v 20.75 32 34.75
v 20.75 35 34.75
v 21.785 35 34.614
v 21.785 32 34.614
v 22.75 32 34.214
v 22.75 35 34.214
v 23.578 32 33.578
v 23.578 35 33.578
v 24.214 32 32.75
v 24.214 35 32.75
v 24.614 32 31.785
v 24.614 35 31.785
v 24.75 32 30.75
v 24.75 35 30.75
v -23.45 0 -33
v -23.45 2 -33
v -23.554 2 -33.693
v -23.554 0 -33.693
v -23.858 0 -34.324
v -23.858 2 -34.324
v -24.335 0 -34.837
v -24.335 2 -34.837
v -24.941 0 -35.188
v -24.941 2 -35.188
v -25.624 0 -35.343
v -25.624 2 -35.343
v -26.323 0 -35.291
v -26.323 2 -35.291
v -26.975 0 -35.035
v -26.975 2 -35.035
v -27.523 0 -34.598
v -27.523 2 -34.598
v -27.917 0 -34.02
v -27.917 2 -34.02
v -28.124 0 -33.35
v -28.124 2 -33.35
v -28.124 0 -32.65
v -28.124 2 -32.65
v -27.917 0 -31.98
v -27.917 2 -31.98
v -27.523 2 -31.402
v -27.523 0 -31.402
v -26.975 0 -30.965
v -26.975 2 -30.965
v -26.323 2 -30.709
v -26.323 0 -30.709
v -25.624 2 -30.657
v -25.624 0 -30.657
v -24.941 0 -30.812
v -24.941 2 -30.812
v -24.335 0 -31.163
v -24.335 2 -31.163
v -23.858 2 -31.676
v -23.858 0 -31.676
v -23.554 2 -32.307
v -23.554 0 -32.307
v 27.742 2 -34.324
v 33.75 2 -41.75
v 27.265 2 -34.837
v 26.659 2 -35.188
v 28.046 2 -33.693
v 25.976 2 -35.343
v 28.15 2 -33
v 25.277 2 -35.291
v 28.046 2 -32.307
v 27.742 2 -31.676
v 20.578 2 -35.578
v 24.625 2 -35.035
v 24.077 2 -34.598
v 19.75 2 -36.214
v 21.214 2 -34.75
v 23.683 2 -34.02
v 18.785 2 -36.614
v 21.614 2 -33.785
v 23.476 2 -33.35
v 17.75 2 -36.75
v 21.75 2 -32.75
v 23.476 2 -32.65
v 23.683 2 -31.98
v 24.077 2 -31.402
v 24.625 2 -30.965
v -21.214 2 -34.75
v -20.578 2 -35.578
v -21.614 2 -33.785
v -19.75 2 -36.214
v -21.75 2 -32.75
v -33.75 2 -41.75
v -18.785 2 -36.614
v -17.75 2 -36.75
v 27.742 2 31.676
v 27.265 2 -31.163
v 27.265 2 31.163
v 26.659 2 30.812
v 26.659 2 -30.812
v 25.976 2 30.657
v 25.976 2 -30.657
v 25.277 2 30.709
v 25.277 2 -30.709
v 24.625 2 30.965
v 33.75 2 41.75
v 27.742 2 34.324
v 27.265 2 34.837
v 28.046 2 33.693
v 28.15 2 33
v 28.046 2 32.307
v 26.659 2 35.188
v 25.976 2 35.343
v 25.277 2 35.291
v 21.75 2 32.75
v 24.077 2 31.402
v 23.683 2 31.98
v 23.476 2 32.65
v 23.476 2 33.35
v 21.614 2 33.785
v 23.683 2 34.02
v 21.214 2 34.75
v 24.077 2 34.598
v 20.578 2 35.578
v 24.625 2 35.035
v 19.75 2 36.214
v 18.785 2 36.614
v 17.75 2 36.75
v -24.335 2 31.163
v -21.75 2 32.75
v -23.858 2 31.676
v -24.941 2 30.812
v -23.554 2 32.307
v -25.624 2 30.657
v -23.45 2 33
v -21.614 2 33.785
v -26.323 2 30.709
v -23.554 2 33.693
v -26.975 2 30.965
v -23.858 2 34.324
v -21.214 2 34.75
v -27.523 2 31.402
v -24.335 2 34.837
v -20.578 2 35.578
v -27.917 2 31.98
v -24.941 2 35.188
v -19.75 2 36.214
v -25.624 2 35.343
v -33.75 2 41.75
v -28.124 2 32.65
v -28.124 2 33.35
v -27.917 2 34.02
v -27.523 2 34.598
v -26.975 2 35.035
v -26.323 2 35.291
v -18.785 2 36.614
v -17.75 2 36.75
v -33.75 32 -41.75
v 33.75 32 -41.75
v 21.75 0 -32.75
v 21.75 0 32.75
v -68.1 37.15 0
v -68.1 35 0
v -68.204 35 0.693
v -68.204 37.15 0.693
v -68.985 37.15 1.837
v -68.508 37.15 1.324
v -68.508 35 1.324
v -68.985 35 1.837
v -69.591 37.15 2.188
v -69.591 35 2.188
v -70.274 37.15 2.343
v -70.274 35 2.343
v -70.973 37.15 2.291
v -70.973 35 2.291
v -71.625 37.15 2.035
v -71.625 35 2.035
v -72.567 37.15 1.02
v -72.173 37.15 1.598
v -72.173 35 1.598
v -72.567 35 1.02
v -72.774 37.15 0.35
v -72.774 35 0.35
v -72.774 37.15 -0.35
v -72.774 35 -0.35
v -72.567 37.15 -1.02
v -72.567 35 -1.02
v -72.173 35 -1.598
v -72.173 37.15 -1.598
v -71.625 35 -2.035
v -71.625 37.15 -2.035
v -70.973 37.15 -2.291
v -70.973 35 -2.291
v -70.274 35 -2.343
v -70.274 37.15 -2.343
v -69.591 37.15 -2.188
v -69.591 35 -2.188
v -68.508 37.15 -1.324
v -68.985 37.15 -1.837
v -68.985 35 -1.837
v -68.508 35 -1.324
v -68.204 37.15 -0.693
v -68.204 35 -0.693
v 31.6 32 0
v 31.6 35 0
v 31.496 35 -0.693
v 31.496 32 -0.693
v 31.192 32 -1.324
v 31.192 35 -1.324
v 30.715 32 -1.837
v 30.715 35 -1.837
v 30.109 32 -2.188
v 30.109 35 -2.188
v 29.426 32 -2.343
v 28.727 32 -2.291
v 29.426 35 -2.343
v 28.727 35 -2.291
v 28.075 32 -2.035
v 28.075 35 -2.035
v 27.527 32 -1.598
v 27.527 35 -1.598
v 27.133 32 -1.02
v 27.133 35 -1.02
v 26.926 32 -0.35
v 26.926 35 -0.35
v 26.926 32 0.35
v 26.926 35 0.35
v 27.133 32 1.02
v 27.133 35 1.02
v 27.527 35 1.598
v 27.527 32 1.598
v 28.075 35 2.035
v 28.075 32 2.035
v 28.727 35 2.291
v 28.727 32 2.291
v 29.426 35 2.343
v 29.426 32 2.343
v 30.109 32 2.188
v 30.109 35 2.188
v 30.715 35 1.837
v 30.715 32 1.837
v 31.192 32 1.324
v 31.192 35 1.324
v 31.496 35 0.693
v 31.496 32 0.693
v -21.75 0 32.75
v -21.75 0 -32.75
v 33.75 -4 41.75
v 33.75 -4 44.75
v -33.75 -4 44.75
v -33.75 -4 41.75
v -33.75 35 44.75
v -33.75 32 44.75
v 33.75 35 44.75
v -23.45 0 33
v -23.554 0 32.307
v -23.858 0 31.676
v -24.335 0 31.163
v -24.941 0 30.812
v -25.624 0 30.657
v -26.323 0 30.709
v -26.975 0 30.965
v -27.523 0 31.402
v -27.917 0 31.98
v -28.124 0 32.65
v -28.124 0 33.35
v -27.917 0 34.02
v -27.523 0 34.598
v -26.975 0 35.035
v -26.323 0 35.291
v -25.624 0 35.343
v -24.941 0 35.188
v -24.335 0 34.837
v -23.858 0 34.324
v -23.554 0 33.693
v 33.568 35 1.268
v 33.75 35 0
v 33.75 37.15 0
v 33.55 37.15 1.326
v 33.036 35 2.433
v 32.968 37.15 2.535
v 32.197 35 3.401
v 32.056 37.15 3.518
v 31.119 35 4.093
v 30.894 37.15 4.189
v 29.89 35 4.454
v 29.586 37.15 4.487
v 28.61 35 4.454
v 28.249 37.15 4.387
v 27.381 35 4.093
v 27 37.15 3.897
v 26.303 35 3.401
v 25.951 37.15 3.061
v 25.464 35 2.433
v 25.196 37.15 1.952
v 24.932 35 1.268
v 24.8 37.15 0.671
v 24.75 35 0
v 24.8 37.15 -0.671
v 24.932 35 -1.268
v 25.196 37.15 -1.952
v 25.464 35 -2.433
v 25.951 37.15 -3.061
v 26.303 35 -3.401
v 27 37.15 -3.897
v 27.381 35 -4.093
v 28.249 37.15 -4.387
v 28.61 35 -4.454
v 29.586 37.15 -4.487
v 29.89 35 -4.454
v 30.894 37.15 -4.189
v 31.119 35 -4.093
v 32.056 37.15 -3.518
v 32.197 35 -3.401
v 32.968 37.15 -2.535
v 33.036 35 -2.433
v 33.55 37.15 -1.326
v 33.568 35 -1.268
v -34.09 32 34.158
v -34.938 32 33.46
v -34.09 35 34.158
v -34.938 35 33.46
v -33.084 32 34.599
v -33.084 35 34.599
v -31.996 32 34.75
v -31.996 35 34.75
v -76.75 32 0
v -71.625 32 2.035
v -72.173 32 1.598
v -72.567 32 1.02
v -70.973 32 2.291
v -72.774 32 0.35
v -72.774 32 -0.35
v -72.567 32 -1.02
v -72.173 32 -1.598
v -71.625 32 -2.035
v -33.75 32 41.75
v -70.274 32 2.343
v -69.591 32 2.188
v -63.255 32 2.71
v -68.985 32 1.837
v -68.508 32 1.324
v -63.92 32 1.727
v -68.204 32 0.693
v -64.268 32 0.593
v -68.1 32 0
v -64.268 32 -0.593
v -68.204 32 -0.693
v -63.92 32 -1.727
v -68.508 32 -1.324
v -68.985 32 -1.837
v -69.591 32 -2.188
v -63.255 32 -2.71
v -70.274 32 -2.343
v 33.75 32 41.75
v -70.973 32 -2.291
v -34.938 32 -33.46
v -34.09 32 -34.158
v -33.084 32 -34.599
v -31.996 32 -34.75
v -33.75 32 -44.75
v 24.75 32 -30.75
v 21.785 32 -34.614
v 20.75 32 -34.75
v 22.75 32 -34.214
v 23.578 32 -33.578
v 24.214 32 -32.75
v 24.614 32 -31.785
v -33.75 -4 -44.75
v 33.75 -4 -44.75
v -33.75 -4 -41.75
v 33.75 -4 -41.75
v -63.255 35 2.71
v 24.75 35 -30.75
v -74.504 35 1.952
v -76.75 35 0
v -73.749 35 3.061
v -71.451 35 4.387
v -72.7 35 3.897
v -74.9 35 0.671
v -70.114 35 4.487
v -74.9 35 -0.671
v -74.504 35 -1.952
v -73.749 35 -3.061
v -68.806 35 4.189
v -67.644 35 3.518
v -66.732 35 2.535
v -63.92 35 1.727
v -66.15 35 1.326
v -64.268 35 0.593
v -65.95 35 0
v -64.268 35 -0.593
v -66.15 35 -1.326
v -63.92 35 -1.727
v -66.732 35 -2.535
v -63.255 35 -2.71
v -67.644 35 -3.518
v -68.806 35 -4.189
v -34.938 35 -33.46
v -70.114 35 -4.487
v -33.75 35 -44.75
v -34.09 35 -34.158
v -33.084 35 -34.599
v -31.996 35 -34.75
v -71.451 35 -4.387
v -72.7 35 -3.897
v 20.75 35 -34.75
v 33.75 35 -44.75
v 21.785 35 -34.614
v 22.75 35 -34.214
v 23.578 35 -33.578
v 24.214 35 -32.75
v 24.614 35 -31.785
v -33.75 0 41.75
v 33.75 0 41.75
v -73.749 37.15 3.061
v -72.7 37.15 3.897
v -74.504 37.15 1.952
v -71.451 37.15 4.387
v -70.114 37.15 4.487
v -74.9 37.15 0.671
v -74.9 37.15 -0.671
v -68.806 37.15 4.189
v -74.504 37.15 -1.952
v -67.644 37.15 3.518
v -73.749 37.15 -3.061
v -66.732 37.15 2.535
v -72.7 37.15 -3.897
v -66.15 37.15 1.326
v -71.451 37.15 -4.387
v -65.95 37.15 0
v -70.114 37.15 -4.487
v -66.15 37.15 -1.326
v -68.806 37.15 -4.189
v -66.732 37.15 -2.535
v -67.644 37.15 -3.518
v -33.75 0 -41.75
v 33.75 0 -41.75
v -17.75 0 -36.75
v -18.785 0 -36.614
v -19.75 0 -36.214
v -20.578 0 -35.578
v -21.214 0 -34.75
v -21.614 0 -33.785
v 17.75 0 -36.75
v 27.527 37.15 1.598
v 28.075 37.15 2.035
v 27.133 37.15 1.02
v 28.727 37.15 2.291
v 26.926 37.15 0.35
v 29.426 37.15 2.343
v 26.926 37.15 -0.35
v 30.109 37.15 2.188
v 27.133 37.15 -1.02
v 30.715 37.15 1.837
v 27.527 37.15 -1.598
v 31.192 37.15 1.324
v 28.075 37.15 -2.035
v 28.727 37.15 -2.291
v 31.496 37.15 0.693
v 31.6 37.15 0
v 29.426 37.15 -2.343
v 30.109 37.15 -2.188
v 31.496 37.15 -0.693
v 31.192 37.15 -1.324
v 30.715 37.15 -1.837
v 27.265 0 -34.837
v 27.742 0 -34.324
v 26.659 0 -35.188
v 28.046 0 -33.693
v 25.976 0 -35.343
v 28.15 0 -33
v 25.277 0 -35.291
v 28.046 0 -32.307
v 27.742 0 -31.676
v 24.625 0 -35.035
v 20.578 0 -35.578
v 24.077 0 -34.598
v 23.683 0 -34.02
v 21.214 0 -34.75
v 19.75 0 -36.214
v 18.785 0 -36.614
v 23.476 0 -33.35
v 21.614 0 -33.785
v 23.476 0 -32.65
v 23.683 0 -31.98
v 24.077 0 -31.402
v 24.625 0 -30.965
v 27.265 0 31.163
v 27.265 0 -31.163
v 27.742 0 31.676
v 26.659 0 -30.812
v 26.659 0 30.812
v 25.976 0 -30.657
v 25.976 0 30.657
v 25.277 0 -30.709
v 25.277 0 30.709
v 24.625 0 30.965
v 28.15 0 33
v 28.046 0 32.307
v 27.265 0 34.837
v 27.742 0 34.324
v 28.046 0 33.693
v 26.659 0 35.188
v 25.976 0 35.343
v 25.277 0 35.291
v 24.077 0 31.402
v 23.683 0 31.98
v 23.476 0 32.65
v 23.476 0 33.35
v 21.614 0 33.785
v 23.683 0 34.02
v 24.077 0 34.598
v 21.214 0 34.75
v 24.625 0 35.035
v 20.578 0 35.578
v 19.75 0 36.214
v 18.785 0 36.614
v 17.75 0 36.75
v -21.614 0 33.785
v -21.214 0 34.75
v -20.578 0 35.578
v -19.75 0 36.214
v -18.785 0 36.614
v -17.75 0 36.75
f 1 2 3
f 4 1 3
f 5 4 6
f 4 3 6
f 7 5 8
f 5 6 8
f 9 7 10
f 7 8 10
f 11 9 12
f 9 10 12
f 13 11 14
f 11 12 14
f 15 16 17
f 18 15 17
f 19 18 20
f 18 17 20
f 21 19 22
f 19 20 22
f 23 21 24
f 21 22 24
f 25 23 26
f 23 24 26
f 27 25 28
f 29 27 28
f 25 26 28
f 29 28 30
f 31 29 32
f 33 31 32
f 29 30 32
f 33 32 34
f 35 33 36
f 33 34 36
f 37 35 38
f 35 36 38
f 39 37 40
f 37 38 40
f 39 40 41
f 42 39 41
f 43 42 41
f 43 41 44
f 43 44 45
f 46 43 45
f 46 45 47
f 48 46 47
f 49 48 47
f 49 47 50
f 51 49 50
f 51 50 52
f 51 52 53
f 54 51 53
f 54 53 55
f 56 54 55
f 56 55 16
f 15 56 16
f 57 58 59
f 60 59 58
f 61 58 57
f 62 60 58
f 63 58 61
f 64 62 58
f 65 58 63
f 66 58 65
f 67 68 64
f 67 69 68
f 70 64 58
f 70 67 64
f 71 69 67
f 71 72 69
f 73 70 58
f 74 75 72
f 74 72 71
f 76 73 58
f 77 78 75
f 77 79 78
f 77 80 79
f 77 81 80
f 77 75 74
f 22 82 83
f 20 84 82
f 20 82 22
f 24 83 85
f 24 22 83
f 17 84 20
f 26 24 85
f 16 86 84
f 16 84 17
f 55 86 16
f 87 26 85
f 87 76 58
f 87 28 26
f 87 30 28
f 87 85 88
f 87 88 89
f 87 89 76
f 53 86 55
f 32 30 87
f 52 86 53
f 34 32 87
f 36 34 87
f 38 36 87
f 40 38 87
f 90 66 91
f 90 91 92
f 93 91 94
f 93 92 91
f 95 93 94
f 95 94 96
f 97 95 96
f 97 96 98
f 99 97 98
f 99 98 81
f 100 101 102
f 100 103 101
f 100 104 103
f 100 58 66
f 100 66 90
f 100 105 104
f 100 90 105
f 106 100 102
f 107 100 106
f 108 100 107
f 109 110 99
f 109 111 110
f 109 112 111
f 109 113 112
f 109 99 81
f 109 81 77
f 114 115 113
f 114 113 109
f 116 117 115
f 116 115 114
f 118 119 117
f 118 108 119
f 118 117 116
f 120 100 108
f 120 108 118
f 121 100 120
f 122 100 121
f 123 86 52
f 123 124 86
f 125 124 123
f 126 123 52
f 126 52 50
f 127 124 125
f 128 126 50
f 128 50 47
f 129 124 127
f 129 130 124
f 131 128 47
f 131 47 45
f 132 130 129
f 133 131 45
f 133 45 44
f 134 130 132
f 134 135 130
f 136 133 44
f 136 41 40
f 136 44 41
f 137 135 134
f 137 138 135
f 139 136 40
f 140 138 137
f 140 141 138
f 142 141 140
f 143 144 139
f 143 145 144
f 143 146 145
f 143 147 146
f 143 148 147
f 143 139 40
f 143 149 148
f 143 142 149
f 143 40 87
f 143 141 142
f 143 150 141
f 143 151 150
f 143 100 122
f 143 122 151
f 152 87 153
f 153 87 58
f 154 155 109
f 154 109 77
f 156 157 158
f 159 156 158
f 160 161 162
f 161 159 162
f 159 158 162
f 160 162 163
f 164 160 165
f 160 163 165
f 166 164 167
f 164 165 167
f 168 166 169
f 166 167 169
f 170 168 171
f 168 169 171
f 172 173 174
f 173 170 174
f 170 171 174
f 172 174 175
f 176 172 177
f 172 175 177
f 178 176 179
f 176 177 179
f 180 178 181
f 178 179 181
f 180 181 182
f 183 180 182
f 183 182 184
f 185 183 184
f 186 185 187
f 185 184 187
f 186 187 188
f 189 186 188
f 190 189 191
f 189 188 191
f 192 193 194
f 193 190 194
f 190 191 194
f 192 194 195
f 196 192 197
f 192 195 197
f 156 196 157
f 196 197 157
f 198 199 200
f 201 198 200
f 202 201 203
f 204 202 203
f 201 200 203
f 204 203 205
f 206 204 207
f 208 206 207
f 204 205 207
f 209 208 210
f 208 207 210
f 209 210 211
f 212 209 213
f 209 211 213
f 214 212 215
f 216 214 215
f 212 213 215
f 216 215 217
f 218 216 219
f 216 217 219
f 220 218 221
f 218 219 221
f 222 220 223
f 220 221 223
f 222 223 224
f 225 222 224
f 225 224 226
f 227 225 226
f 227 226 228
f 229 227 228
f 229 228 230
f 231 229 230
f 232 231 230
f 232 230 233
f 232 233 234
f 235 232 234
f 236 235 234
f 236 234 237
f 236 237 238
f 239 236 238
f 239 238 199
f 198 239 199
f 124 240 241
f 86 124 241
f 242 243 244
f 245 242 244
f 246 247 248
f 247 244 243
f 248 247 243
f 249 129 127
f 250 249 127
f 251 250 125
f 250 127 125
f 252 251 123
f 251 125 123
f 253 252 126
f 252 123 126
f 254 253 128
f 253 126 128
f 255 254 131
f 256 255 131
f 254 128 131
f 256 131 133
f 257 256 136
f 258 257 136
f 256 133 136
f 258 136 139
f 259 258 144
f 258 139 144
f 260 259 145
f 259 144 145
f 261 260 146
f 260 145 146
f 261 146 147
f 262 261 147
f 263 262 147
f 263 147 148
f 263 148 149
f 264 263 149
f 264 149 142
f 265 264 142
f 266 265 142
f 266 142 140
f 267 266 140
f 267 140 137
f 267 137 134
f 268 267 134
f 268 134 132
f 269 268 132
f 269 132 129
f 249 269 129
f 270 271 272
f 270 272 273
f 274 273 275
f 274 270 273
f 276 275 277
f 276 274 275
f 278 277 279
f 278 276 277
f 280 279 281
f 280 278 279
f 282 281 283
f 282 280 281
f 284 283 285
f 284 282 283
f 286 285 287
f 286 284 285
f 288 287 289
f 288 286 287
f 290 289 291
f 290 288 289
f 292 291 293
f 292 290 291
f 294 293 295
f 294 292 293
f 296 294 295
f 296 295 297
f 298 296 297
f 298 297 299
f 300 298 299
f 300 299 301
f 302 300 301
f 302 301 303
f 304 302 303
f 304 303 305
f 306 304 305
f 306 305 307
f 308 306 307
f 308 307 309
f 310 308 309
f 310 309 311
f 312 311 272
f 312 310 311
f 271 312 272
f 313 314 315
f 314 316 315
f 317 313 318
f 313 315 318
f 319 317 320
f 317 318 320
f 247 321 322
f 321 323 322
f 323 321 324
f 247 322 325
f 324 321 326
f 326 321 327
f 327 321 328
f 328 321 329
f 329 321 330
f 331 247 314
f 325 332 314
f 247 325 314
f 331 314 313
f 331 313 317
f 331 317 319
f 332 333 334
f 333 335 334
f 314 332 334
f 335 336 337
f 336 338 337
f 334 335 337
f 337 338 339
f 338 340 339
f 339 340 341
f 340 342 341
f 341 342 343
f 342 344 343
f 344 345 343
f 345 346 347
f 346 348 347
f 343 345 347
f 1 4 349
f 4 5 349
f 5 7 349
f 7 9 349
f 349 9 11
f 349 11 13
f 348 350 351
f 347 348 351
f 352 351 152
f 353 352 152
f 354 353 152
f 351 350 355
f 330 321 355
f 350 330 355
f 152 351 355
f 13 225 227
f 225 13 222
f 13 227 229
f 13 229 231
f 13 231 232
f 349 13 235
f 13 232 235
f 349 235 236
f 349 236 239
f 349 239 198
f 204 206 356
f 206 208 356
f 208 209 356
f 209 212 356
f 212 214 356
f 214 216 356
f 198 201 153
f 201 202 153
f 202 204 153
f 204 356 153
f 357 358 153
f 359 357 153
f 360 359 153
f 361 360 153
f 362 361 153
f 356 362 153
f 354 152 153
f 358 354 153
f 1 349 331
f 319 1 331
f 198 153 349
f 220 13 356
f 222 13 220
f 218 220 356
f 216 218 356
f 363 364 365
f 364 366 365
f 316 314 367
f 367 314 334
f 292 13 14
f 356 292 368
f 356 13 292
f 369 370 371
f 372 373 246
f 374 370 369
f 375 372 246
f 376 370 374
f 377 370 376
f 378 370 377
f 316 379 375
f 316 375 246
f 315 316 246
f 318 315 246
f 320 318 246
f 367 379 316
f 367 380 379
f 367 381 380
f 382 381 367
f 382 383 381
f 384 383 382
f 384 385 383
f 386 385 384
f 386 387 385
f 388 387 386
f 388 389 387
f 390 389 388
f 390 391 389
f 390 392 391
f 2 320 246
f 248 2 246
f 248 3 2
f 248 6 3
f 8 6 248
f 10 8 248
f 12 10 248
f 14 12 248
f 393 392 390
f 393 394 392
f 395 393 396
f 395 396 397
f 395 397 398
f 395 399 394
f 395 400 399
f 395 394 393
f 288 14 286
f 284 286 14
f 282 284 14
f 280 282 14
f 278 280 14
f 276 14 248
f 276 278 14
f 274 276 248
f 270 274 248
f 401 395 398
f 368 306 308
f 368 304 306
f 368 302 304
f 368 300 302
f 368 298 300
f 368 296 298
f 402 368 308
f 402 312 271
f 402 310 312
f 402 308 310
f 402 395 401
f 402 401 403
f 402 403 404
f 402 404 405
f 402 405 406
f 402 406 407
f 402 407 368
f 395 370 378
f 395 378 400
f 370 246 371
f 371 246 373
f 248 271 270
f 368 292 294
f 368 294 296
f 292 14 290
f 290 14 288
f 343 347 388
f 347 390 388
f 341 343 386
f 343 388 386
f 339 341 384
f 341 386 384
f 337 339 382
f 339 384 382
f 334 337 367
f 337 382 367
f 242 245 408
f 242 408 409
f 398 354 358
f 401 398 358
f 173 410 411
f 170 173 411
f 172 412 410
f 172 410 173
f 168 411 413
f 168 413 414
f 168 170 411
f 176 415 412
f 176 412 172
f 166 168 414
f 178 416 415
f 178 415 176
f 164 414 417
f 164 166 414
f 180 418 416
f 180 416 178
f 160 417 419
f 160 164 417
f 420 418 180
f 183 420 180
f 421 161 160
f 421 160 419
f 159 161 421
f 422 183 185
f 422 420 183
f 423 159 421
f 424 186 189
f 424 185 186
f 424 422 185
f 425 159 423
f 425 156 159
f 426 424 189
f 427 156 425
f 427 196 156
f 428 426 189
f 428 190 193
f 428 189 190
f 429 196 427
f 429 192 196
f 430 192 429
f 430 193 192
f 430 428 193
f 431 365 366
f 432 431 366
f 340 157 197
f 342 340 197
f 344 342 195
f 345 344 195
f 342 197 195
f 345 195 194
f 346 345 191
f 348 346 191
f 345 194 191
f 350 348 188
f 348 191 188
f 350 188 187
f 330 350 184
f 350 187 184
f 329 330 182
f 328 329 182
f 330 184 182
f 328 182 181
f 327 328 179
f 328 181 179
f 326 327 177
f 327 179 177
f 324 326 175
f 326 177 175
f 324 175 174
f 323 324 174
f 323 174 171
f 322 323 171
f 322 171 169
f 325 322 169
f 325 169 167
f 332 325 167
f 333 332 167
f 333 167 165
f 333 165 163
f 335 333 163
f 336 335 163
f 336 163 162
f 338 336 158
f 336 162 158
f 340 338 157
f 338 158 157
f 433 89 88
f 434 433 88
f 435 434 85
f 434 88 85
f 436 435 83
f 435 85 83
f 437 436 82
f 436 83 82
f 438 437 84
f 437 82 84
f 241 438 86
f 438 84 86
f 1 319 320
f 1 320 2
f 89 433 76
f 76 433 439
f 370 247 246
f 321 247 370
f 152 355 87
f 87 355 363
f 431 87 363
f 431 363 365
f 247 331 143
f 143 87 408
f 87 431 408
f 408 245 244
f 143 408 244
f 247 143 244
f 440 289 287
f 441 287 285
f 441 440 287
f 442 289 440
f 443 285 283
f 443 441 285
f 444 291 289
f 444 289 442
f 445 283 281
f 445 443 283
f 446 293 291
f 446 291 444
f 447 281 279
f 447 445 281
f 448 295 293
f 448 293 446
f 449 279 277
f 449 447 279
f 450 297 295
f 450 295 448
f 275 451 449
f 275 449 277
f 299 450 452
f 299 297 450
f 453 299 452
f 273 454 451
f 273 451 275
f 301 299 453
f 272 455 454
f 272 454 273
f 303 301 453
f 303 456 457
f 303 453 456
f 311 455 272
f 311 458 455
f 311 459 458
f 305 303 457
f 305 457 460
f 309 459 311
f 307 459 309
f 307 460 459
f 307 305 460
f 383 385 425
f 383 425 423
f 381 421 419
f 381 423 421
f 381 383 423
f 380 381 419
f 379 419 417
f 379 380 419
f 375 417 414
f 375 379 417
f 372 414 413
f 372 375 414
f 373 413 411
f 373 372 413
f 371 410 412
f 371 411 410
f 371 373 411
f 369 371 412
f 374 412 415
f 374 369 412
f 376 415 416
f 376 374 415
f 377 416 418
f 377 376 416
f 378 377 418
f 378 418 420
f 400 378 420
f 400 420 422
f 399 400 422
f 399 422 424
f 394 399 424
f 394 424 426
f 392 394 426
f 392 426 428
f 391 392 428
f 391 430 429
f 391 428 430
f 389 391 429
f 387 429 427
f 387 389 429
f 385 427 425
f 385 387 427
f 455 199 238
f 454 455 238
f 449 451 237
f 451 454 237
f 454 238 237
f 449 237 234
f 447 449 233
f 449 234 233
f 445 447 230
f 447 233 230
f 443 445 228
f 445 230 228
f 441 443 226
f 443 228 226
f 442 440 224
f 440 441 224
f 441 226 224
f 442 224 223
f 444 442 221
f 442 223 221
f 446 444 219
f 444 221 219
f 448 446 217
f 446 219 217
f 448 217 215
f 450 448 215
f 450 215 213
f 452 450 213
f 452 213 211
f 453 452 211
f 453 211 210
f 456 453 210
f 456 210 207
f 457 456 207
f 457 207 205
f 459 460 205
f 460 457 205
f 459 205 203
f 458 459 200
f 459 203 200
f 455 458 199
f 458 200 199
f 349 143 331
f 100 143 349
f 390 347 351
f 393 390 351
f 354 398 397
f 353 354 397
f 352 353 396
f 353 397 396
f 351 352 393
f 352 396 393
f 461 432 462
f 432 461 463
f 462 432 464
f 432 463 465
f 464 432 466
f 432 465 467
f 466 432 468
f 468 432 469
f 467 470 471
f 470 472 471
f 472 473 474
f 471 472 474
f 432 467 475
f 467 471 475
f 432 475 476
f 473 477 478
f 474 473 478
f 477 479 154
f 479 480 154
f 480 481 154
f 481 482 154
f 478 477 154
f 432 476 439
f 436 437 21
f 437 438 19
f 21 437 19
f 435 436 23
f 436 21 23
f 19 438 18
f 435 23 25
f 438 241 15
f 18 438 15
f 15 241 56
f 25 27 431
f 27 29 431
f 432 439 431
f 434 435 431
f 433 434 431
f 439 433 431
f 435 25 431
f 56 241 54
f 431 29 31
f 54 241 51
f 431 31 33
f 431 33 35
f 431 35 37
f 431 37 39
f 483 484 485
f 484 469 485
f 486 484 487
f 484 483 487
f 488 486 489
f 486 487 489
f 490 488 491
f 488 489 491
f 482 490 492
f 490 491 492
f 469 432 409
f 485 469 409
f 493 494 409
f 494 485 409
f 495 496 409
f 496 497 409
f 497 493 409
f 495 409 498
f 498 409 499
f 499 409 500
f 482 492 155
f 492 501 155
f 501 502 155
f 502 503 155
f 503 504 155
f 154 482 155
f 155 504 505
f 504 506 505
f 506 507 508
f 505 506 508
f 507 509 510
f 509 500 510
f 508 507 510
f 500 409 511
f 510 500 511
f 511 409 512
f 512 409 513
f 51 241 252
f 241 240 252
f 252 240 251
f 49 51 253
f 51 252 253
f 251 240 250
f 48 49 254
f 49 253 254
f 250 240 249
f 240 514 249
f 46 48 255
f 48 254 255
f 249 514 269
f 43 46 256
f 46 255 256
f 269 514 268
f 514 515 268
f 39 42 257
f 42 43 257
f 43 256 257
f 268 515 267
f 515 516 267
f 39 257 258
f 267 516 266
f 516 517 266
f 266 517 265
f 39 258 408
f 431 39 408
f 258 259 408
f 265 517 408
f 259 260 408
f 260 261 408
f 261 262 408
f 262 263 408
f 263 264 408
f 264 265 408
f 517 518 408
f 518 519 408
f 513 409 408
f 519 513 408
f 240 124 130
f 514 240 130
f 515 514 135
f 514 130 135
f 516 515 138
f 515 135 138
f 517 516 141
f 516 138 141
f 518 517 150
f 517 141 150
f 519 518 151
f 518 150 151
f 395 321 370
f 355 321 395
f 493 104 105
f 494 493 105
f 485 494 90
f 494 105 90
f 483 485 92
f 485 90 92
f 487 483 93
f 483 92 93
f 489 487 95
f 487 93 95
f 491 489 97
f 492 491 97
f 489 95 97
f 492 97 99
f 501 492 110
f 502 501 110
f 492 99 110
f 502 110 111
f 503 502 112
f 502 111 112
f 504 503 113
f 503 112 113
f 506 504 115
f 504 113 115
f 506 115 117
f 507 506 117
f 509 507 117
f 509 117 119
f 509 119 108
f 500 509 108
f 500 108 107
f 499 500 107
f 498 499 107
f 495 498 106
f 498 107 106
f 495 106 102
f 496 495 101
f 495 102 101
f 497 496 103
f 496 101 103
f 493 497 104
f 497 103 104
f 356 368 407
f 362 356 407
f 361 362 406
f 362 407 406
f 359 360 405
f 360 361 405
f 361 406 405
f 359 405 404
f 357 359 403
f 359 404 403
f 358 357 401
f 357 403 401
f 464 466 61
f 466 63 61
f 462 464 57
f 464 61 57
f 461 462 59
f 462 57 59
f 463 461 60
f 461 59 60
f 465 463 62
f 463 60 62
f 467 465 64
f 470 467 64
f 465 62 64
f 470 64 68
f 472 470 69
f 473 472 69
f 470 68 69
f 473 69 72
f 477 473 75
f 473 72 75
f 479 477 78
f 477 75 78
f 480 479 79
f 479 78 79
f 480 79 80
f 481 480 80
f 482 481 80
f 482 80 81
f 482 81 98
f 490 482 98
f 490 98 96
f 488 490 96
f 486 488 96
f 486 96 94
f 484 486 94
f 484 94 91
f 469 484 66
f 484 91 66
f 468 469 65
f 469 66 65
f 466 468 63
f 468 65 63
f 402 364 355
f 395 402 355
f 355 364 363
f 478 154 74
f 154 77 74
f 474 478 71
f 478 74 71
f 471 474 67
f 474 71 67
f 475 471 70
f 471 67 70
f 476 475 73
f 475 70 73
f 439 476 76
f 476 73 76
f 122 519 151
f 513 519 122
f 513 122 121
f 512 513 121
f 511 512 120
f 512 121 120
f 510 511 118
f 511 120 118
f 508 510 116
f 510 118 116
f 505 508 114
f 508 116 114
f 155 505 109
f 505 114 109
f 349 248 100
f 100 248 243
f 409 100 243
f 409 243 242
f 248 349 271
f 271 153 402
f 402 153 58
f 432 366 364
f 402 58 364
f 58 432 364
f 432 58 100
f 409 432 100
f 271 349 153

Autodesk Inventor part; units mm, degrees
ref_plane "YZ Plane" through (0, 0, 0) normal (1, 0, 0) x (0, 1, 0)
ref_plane "XZ Plane" through (0, 0, 0) normal (0, 1, 0) x (-1, 0, 0)
ref_plane "XY Plane" through (0, 0, 0) normal (0, 0, 1) x (1, 0, 0)
sketch "Sketch1" plane through (0, 0, 0) normal (0, 1, 0) x (-1, 0, 0)
  line L0 (33.75, 44.75) -> (-33.75, 44.75)
  line L1 (-33.75, 44.75) -> (-33.75, -44.75)
  line L2 (-33.75, -44.75) -> (33.75, -44.75)
  line L3 (33.75, -44.75) -> (33.75, 44.75)
  line L4 (21.75, -36.75) -> (-21.75, -36.75)
  line L5 (21.75, 36.75) -> (-21.75, 36.75)
  line L6 (21.75, 36.75) -> (21.75, -36.75)
  line L7 (-21.75, 36.75) -> (-21.75, -36.75)
  line L8 (33.75, -41.75) -> (-33.75, -41.75)
  line L9 (33.75, 41.75) -> (-33.75, 41.75)
  point P0 (0, 0)
  point P1 (-33.75, 0)
  dimension "d0" = 83.5
  dimension "d1" = 3
  dimension "d2" = 3
  dimension "d4" = 5
  dimension "d5" = 5
  dimension "d6" = 12
  dimension "d7" = 12
  dimension "d8" = 67.5
  dimension "d9" = 33.75
  dimension "d10" = 41.75
extrude "Extrusion1" add sketch "Sketch1" along normal blind 2 contours L3 L8 L1 L9
extrude "Extrusion2" add sketch "Sketch1" along normal blind 32 and the other way blind 4 contours L3 L9 L1 L0 | L3 L2 L1 L8
sketch "Sketch2" plane through (0, 32, 0) normal (0, 1, 0) x (1, 0, 0)
  line L0 (33.75, -44.75) -> (33.75, -41.75) projected
  line L1 (33.75, -41.75) -> (-33.75, -41.75) projected
  line L2 (-33.75, -41.75) -> (-33.75, -44.75) projected
  line L3 (-33.75, -44.75) -> (33.75, -44.75) projected
  line L4 (-33.75, 44.75) -> (-33.75, 41.75) projected
  line L5 (-33.75, 41.75) -> (33.75, 41.75) projected
  line L6 (33.75, 41.75) -> (33.75, 44.75) projected
  line L7 (33.75, 44.75) -> (-33.75, 44.75) projected
  line L8 (-33.75, 41.75) -> (-33.75, -41.75) projected
  line L9 (33.75, -41.75) -> (33.75, 41.75) projected
  line L10 (-33.75, 34.75) -> (24.75, 34.75)
  line L11 (-33.75, -34.75) -> (24.75, -34.75)
  line L12 (24.75, -34.75) -> (24.75, 0)
  line L13 (24.75, 0) -> (24.75, 34.75)
  line L14 (-33.75, -34.75) -> (-65.75, 0)
  line L15 (-65.75, 0) -> (-33.75, 34.75)
  line L16 (33.75, 44.75) -> (33.75, 0)
  line L17 (33.75, -41.75) -> (33.75, -44.75) projected
  line L18 (33.75, 0) -> (33.75, -44.75)
  line L19 (-33.75, -44.75) -> (-76.75, 0)
  line L20 (-33.75, 44.75) -> (-33.75, 41.75) projected
  line L21 (-76.75, 0) -> (-33.75, 44.75)
  point P0 (0, 0)
  dimension "d18" = 7
  dimension "d19" = 7
  dimension "d20" = 110.5
  dimension "d21" = 90.5
  dimension "d42" = 9
extrude "Extrusion3" add sketch "Sketch2" along normal blind 3 contours L3 L2 L1 L0 | L1 L8 L11 L12 L13 L10 L5 L9 | L19 L21 L4 L8 L15 L14 L2 | L5 L4 L7 L6
sketch "Sketch3" plane through (0, 35, 0) normal (0, 1, 0) x (1, 0, 0)
  circle A0 centre (29.25, 0) radius 4.5
  circle A1 centre (-70.45, 0) radius 4.5
  circle A2 centre (-70.45, 0) radius 2.35
  circle A3 centre (29.25, 0) radius 2.35
  line L0 (33.75, -44.75) -> (33.75, 44.75) projected
  point P0 (0, 0)
  dimension "d24" = 9
  dimension "d27" = 4.7
  dimension "d43" = 99.7
  dimension "d44" = 4.5
extrude "Extrusion4" add sketch "Sketch3" along normal blind 2.15
extrude "Extrusion5" cut sketch "Sketch3" against normal blind 3 contours A2 | A3
sketch "Sketch4" plane through (0, 2, 0) normal (0, 1, 0) x (1, 0, 0)
  circle A0 centre (-25.8, -33) radius 2.35
  circle A1 centre (-25.8, 33) radius 2.35
  circle A2 centre (25.8, -33) radius 2.35
  circle A3 centre (25.8, 33) radius 2.35
  line L0 (-33.75, 41.75) -> (-33.75, -41.75) projected
  line L1 (-33.75, -41.75) -> (33.75, -41.75) projected
  line L2 (33.75, -41.75) -> (33.75, 41.75) projected
  line L3 (33.75, 41.75) -> (-33.75, 41.75) projected
  point P0 (0, 0)
  dimension "d35" = 4.7
  dimension "d36" = 7.95
  dimension "d37" = 8.75
  dimension "d38" = 7.95
  dimension "d39" = 8.75
extrude "Extrusion6" cut sketch "Sketch4" against normal blind 3 contours A0 | A1 | A2 | A3
fillet "Fillet1" radius 4 9 edges at (-33.75, 33.5, 34.75) (-65.75, 33.5, 0) (-33.75, 33.5, -34.75) (24.75, 33.5, 34.75) (24.75, 33.5, -34.75) (21.75, 1, 36.75) (21.75, 1, -36.75) (-21.75, 1, 36.75) (-21.75, 1, -36.75)
equation "\"d2\" = d1"
equation "\"d5\" = d4"
equation "\"d7\" = d6"
equation "\"d9\" = 0.5 * d8"
equation "\"d10\" = 0.5 * d0"
equation "\"d19\" = d18"
equation "\"d44\" = 0.5 * d24"
equation "\"d38\" = d36"
equation "\"d39\" = d37"
properties part number "CO-1-01-fuseMount"
